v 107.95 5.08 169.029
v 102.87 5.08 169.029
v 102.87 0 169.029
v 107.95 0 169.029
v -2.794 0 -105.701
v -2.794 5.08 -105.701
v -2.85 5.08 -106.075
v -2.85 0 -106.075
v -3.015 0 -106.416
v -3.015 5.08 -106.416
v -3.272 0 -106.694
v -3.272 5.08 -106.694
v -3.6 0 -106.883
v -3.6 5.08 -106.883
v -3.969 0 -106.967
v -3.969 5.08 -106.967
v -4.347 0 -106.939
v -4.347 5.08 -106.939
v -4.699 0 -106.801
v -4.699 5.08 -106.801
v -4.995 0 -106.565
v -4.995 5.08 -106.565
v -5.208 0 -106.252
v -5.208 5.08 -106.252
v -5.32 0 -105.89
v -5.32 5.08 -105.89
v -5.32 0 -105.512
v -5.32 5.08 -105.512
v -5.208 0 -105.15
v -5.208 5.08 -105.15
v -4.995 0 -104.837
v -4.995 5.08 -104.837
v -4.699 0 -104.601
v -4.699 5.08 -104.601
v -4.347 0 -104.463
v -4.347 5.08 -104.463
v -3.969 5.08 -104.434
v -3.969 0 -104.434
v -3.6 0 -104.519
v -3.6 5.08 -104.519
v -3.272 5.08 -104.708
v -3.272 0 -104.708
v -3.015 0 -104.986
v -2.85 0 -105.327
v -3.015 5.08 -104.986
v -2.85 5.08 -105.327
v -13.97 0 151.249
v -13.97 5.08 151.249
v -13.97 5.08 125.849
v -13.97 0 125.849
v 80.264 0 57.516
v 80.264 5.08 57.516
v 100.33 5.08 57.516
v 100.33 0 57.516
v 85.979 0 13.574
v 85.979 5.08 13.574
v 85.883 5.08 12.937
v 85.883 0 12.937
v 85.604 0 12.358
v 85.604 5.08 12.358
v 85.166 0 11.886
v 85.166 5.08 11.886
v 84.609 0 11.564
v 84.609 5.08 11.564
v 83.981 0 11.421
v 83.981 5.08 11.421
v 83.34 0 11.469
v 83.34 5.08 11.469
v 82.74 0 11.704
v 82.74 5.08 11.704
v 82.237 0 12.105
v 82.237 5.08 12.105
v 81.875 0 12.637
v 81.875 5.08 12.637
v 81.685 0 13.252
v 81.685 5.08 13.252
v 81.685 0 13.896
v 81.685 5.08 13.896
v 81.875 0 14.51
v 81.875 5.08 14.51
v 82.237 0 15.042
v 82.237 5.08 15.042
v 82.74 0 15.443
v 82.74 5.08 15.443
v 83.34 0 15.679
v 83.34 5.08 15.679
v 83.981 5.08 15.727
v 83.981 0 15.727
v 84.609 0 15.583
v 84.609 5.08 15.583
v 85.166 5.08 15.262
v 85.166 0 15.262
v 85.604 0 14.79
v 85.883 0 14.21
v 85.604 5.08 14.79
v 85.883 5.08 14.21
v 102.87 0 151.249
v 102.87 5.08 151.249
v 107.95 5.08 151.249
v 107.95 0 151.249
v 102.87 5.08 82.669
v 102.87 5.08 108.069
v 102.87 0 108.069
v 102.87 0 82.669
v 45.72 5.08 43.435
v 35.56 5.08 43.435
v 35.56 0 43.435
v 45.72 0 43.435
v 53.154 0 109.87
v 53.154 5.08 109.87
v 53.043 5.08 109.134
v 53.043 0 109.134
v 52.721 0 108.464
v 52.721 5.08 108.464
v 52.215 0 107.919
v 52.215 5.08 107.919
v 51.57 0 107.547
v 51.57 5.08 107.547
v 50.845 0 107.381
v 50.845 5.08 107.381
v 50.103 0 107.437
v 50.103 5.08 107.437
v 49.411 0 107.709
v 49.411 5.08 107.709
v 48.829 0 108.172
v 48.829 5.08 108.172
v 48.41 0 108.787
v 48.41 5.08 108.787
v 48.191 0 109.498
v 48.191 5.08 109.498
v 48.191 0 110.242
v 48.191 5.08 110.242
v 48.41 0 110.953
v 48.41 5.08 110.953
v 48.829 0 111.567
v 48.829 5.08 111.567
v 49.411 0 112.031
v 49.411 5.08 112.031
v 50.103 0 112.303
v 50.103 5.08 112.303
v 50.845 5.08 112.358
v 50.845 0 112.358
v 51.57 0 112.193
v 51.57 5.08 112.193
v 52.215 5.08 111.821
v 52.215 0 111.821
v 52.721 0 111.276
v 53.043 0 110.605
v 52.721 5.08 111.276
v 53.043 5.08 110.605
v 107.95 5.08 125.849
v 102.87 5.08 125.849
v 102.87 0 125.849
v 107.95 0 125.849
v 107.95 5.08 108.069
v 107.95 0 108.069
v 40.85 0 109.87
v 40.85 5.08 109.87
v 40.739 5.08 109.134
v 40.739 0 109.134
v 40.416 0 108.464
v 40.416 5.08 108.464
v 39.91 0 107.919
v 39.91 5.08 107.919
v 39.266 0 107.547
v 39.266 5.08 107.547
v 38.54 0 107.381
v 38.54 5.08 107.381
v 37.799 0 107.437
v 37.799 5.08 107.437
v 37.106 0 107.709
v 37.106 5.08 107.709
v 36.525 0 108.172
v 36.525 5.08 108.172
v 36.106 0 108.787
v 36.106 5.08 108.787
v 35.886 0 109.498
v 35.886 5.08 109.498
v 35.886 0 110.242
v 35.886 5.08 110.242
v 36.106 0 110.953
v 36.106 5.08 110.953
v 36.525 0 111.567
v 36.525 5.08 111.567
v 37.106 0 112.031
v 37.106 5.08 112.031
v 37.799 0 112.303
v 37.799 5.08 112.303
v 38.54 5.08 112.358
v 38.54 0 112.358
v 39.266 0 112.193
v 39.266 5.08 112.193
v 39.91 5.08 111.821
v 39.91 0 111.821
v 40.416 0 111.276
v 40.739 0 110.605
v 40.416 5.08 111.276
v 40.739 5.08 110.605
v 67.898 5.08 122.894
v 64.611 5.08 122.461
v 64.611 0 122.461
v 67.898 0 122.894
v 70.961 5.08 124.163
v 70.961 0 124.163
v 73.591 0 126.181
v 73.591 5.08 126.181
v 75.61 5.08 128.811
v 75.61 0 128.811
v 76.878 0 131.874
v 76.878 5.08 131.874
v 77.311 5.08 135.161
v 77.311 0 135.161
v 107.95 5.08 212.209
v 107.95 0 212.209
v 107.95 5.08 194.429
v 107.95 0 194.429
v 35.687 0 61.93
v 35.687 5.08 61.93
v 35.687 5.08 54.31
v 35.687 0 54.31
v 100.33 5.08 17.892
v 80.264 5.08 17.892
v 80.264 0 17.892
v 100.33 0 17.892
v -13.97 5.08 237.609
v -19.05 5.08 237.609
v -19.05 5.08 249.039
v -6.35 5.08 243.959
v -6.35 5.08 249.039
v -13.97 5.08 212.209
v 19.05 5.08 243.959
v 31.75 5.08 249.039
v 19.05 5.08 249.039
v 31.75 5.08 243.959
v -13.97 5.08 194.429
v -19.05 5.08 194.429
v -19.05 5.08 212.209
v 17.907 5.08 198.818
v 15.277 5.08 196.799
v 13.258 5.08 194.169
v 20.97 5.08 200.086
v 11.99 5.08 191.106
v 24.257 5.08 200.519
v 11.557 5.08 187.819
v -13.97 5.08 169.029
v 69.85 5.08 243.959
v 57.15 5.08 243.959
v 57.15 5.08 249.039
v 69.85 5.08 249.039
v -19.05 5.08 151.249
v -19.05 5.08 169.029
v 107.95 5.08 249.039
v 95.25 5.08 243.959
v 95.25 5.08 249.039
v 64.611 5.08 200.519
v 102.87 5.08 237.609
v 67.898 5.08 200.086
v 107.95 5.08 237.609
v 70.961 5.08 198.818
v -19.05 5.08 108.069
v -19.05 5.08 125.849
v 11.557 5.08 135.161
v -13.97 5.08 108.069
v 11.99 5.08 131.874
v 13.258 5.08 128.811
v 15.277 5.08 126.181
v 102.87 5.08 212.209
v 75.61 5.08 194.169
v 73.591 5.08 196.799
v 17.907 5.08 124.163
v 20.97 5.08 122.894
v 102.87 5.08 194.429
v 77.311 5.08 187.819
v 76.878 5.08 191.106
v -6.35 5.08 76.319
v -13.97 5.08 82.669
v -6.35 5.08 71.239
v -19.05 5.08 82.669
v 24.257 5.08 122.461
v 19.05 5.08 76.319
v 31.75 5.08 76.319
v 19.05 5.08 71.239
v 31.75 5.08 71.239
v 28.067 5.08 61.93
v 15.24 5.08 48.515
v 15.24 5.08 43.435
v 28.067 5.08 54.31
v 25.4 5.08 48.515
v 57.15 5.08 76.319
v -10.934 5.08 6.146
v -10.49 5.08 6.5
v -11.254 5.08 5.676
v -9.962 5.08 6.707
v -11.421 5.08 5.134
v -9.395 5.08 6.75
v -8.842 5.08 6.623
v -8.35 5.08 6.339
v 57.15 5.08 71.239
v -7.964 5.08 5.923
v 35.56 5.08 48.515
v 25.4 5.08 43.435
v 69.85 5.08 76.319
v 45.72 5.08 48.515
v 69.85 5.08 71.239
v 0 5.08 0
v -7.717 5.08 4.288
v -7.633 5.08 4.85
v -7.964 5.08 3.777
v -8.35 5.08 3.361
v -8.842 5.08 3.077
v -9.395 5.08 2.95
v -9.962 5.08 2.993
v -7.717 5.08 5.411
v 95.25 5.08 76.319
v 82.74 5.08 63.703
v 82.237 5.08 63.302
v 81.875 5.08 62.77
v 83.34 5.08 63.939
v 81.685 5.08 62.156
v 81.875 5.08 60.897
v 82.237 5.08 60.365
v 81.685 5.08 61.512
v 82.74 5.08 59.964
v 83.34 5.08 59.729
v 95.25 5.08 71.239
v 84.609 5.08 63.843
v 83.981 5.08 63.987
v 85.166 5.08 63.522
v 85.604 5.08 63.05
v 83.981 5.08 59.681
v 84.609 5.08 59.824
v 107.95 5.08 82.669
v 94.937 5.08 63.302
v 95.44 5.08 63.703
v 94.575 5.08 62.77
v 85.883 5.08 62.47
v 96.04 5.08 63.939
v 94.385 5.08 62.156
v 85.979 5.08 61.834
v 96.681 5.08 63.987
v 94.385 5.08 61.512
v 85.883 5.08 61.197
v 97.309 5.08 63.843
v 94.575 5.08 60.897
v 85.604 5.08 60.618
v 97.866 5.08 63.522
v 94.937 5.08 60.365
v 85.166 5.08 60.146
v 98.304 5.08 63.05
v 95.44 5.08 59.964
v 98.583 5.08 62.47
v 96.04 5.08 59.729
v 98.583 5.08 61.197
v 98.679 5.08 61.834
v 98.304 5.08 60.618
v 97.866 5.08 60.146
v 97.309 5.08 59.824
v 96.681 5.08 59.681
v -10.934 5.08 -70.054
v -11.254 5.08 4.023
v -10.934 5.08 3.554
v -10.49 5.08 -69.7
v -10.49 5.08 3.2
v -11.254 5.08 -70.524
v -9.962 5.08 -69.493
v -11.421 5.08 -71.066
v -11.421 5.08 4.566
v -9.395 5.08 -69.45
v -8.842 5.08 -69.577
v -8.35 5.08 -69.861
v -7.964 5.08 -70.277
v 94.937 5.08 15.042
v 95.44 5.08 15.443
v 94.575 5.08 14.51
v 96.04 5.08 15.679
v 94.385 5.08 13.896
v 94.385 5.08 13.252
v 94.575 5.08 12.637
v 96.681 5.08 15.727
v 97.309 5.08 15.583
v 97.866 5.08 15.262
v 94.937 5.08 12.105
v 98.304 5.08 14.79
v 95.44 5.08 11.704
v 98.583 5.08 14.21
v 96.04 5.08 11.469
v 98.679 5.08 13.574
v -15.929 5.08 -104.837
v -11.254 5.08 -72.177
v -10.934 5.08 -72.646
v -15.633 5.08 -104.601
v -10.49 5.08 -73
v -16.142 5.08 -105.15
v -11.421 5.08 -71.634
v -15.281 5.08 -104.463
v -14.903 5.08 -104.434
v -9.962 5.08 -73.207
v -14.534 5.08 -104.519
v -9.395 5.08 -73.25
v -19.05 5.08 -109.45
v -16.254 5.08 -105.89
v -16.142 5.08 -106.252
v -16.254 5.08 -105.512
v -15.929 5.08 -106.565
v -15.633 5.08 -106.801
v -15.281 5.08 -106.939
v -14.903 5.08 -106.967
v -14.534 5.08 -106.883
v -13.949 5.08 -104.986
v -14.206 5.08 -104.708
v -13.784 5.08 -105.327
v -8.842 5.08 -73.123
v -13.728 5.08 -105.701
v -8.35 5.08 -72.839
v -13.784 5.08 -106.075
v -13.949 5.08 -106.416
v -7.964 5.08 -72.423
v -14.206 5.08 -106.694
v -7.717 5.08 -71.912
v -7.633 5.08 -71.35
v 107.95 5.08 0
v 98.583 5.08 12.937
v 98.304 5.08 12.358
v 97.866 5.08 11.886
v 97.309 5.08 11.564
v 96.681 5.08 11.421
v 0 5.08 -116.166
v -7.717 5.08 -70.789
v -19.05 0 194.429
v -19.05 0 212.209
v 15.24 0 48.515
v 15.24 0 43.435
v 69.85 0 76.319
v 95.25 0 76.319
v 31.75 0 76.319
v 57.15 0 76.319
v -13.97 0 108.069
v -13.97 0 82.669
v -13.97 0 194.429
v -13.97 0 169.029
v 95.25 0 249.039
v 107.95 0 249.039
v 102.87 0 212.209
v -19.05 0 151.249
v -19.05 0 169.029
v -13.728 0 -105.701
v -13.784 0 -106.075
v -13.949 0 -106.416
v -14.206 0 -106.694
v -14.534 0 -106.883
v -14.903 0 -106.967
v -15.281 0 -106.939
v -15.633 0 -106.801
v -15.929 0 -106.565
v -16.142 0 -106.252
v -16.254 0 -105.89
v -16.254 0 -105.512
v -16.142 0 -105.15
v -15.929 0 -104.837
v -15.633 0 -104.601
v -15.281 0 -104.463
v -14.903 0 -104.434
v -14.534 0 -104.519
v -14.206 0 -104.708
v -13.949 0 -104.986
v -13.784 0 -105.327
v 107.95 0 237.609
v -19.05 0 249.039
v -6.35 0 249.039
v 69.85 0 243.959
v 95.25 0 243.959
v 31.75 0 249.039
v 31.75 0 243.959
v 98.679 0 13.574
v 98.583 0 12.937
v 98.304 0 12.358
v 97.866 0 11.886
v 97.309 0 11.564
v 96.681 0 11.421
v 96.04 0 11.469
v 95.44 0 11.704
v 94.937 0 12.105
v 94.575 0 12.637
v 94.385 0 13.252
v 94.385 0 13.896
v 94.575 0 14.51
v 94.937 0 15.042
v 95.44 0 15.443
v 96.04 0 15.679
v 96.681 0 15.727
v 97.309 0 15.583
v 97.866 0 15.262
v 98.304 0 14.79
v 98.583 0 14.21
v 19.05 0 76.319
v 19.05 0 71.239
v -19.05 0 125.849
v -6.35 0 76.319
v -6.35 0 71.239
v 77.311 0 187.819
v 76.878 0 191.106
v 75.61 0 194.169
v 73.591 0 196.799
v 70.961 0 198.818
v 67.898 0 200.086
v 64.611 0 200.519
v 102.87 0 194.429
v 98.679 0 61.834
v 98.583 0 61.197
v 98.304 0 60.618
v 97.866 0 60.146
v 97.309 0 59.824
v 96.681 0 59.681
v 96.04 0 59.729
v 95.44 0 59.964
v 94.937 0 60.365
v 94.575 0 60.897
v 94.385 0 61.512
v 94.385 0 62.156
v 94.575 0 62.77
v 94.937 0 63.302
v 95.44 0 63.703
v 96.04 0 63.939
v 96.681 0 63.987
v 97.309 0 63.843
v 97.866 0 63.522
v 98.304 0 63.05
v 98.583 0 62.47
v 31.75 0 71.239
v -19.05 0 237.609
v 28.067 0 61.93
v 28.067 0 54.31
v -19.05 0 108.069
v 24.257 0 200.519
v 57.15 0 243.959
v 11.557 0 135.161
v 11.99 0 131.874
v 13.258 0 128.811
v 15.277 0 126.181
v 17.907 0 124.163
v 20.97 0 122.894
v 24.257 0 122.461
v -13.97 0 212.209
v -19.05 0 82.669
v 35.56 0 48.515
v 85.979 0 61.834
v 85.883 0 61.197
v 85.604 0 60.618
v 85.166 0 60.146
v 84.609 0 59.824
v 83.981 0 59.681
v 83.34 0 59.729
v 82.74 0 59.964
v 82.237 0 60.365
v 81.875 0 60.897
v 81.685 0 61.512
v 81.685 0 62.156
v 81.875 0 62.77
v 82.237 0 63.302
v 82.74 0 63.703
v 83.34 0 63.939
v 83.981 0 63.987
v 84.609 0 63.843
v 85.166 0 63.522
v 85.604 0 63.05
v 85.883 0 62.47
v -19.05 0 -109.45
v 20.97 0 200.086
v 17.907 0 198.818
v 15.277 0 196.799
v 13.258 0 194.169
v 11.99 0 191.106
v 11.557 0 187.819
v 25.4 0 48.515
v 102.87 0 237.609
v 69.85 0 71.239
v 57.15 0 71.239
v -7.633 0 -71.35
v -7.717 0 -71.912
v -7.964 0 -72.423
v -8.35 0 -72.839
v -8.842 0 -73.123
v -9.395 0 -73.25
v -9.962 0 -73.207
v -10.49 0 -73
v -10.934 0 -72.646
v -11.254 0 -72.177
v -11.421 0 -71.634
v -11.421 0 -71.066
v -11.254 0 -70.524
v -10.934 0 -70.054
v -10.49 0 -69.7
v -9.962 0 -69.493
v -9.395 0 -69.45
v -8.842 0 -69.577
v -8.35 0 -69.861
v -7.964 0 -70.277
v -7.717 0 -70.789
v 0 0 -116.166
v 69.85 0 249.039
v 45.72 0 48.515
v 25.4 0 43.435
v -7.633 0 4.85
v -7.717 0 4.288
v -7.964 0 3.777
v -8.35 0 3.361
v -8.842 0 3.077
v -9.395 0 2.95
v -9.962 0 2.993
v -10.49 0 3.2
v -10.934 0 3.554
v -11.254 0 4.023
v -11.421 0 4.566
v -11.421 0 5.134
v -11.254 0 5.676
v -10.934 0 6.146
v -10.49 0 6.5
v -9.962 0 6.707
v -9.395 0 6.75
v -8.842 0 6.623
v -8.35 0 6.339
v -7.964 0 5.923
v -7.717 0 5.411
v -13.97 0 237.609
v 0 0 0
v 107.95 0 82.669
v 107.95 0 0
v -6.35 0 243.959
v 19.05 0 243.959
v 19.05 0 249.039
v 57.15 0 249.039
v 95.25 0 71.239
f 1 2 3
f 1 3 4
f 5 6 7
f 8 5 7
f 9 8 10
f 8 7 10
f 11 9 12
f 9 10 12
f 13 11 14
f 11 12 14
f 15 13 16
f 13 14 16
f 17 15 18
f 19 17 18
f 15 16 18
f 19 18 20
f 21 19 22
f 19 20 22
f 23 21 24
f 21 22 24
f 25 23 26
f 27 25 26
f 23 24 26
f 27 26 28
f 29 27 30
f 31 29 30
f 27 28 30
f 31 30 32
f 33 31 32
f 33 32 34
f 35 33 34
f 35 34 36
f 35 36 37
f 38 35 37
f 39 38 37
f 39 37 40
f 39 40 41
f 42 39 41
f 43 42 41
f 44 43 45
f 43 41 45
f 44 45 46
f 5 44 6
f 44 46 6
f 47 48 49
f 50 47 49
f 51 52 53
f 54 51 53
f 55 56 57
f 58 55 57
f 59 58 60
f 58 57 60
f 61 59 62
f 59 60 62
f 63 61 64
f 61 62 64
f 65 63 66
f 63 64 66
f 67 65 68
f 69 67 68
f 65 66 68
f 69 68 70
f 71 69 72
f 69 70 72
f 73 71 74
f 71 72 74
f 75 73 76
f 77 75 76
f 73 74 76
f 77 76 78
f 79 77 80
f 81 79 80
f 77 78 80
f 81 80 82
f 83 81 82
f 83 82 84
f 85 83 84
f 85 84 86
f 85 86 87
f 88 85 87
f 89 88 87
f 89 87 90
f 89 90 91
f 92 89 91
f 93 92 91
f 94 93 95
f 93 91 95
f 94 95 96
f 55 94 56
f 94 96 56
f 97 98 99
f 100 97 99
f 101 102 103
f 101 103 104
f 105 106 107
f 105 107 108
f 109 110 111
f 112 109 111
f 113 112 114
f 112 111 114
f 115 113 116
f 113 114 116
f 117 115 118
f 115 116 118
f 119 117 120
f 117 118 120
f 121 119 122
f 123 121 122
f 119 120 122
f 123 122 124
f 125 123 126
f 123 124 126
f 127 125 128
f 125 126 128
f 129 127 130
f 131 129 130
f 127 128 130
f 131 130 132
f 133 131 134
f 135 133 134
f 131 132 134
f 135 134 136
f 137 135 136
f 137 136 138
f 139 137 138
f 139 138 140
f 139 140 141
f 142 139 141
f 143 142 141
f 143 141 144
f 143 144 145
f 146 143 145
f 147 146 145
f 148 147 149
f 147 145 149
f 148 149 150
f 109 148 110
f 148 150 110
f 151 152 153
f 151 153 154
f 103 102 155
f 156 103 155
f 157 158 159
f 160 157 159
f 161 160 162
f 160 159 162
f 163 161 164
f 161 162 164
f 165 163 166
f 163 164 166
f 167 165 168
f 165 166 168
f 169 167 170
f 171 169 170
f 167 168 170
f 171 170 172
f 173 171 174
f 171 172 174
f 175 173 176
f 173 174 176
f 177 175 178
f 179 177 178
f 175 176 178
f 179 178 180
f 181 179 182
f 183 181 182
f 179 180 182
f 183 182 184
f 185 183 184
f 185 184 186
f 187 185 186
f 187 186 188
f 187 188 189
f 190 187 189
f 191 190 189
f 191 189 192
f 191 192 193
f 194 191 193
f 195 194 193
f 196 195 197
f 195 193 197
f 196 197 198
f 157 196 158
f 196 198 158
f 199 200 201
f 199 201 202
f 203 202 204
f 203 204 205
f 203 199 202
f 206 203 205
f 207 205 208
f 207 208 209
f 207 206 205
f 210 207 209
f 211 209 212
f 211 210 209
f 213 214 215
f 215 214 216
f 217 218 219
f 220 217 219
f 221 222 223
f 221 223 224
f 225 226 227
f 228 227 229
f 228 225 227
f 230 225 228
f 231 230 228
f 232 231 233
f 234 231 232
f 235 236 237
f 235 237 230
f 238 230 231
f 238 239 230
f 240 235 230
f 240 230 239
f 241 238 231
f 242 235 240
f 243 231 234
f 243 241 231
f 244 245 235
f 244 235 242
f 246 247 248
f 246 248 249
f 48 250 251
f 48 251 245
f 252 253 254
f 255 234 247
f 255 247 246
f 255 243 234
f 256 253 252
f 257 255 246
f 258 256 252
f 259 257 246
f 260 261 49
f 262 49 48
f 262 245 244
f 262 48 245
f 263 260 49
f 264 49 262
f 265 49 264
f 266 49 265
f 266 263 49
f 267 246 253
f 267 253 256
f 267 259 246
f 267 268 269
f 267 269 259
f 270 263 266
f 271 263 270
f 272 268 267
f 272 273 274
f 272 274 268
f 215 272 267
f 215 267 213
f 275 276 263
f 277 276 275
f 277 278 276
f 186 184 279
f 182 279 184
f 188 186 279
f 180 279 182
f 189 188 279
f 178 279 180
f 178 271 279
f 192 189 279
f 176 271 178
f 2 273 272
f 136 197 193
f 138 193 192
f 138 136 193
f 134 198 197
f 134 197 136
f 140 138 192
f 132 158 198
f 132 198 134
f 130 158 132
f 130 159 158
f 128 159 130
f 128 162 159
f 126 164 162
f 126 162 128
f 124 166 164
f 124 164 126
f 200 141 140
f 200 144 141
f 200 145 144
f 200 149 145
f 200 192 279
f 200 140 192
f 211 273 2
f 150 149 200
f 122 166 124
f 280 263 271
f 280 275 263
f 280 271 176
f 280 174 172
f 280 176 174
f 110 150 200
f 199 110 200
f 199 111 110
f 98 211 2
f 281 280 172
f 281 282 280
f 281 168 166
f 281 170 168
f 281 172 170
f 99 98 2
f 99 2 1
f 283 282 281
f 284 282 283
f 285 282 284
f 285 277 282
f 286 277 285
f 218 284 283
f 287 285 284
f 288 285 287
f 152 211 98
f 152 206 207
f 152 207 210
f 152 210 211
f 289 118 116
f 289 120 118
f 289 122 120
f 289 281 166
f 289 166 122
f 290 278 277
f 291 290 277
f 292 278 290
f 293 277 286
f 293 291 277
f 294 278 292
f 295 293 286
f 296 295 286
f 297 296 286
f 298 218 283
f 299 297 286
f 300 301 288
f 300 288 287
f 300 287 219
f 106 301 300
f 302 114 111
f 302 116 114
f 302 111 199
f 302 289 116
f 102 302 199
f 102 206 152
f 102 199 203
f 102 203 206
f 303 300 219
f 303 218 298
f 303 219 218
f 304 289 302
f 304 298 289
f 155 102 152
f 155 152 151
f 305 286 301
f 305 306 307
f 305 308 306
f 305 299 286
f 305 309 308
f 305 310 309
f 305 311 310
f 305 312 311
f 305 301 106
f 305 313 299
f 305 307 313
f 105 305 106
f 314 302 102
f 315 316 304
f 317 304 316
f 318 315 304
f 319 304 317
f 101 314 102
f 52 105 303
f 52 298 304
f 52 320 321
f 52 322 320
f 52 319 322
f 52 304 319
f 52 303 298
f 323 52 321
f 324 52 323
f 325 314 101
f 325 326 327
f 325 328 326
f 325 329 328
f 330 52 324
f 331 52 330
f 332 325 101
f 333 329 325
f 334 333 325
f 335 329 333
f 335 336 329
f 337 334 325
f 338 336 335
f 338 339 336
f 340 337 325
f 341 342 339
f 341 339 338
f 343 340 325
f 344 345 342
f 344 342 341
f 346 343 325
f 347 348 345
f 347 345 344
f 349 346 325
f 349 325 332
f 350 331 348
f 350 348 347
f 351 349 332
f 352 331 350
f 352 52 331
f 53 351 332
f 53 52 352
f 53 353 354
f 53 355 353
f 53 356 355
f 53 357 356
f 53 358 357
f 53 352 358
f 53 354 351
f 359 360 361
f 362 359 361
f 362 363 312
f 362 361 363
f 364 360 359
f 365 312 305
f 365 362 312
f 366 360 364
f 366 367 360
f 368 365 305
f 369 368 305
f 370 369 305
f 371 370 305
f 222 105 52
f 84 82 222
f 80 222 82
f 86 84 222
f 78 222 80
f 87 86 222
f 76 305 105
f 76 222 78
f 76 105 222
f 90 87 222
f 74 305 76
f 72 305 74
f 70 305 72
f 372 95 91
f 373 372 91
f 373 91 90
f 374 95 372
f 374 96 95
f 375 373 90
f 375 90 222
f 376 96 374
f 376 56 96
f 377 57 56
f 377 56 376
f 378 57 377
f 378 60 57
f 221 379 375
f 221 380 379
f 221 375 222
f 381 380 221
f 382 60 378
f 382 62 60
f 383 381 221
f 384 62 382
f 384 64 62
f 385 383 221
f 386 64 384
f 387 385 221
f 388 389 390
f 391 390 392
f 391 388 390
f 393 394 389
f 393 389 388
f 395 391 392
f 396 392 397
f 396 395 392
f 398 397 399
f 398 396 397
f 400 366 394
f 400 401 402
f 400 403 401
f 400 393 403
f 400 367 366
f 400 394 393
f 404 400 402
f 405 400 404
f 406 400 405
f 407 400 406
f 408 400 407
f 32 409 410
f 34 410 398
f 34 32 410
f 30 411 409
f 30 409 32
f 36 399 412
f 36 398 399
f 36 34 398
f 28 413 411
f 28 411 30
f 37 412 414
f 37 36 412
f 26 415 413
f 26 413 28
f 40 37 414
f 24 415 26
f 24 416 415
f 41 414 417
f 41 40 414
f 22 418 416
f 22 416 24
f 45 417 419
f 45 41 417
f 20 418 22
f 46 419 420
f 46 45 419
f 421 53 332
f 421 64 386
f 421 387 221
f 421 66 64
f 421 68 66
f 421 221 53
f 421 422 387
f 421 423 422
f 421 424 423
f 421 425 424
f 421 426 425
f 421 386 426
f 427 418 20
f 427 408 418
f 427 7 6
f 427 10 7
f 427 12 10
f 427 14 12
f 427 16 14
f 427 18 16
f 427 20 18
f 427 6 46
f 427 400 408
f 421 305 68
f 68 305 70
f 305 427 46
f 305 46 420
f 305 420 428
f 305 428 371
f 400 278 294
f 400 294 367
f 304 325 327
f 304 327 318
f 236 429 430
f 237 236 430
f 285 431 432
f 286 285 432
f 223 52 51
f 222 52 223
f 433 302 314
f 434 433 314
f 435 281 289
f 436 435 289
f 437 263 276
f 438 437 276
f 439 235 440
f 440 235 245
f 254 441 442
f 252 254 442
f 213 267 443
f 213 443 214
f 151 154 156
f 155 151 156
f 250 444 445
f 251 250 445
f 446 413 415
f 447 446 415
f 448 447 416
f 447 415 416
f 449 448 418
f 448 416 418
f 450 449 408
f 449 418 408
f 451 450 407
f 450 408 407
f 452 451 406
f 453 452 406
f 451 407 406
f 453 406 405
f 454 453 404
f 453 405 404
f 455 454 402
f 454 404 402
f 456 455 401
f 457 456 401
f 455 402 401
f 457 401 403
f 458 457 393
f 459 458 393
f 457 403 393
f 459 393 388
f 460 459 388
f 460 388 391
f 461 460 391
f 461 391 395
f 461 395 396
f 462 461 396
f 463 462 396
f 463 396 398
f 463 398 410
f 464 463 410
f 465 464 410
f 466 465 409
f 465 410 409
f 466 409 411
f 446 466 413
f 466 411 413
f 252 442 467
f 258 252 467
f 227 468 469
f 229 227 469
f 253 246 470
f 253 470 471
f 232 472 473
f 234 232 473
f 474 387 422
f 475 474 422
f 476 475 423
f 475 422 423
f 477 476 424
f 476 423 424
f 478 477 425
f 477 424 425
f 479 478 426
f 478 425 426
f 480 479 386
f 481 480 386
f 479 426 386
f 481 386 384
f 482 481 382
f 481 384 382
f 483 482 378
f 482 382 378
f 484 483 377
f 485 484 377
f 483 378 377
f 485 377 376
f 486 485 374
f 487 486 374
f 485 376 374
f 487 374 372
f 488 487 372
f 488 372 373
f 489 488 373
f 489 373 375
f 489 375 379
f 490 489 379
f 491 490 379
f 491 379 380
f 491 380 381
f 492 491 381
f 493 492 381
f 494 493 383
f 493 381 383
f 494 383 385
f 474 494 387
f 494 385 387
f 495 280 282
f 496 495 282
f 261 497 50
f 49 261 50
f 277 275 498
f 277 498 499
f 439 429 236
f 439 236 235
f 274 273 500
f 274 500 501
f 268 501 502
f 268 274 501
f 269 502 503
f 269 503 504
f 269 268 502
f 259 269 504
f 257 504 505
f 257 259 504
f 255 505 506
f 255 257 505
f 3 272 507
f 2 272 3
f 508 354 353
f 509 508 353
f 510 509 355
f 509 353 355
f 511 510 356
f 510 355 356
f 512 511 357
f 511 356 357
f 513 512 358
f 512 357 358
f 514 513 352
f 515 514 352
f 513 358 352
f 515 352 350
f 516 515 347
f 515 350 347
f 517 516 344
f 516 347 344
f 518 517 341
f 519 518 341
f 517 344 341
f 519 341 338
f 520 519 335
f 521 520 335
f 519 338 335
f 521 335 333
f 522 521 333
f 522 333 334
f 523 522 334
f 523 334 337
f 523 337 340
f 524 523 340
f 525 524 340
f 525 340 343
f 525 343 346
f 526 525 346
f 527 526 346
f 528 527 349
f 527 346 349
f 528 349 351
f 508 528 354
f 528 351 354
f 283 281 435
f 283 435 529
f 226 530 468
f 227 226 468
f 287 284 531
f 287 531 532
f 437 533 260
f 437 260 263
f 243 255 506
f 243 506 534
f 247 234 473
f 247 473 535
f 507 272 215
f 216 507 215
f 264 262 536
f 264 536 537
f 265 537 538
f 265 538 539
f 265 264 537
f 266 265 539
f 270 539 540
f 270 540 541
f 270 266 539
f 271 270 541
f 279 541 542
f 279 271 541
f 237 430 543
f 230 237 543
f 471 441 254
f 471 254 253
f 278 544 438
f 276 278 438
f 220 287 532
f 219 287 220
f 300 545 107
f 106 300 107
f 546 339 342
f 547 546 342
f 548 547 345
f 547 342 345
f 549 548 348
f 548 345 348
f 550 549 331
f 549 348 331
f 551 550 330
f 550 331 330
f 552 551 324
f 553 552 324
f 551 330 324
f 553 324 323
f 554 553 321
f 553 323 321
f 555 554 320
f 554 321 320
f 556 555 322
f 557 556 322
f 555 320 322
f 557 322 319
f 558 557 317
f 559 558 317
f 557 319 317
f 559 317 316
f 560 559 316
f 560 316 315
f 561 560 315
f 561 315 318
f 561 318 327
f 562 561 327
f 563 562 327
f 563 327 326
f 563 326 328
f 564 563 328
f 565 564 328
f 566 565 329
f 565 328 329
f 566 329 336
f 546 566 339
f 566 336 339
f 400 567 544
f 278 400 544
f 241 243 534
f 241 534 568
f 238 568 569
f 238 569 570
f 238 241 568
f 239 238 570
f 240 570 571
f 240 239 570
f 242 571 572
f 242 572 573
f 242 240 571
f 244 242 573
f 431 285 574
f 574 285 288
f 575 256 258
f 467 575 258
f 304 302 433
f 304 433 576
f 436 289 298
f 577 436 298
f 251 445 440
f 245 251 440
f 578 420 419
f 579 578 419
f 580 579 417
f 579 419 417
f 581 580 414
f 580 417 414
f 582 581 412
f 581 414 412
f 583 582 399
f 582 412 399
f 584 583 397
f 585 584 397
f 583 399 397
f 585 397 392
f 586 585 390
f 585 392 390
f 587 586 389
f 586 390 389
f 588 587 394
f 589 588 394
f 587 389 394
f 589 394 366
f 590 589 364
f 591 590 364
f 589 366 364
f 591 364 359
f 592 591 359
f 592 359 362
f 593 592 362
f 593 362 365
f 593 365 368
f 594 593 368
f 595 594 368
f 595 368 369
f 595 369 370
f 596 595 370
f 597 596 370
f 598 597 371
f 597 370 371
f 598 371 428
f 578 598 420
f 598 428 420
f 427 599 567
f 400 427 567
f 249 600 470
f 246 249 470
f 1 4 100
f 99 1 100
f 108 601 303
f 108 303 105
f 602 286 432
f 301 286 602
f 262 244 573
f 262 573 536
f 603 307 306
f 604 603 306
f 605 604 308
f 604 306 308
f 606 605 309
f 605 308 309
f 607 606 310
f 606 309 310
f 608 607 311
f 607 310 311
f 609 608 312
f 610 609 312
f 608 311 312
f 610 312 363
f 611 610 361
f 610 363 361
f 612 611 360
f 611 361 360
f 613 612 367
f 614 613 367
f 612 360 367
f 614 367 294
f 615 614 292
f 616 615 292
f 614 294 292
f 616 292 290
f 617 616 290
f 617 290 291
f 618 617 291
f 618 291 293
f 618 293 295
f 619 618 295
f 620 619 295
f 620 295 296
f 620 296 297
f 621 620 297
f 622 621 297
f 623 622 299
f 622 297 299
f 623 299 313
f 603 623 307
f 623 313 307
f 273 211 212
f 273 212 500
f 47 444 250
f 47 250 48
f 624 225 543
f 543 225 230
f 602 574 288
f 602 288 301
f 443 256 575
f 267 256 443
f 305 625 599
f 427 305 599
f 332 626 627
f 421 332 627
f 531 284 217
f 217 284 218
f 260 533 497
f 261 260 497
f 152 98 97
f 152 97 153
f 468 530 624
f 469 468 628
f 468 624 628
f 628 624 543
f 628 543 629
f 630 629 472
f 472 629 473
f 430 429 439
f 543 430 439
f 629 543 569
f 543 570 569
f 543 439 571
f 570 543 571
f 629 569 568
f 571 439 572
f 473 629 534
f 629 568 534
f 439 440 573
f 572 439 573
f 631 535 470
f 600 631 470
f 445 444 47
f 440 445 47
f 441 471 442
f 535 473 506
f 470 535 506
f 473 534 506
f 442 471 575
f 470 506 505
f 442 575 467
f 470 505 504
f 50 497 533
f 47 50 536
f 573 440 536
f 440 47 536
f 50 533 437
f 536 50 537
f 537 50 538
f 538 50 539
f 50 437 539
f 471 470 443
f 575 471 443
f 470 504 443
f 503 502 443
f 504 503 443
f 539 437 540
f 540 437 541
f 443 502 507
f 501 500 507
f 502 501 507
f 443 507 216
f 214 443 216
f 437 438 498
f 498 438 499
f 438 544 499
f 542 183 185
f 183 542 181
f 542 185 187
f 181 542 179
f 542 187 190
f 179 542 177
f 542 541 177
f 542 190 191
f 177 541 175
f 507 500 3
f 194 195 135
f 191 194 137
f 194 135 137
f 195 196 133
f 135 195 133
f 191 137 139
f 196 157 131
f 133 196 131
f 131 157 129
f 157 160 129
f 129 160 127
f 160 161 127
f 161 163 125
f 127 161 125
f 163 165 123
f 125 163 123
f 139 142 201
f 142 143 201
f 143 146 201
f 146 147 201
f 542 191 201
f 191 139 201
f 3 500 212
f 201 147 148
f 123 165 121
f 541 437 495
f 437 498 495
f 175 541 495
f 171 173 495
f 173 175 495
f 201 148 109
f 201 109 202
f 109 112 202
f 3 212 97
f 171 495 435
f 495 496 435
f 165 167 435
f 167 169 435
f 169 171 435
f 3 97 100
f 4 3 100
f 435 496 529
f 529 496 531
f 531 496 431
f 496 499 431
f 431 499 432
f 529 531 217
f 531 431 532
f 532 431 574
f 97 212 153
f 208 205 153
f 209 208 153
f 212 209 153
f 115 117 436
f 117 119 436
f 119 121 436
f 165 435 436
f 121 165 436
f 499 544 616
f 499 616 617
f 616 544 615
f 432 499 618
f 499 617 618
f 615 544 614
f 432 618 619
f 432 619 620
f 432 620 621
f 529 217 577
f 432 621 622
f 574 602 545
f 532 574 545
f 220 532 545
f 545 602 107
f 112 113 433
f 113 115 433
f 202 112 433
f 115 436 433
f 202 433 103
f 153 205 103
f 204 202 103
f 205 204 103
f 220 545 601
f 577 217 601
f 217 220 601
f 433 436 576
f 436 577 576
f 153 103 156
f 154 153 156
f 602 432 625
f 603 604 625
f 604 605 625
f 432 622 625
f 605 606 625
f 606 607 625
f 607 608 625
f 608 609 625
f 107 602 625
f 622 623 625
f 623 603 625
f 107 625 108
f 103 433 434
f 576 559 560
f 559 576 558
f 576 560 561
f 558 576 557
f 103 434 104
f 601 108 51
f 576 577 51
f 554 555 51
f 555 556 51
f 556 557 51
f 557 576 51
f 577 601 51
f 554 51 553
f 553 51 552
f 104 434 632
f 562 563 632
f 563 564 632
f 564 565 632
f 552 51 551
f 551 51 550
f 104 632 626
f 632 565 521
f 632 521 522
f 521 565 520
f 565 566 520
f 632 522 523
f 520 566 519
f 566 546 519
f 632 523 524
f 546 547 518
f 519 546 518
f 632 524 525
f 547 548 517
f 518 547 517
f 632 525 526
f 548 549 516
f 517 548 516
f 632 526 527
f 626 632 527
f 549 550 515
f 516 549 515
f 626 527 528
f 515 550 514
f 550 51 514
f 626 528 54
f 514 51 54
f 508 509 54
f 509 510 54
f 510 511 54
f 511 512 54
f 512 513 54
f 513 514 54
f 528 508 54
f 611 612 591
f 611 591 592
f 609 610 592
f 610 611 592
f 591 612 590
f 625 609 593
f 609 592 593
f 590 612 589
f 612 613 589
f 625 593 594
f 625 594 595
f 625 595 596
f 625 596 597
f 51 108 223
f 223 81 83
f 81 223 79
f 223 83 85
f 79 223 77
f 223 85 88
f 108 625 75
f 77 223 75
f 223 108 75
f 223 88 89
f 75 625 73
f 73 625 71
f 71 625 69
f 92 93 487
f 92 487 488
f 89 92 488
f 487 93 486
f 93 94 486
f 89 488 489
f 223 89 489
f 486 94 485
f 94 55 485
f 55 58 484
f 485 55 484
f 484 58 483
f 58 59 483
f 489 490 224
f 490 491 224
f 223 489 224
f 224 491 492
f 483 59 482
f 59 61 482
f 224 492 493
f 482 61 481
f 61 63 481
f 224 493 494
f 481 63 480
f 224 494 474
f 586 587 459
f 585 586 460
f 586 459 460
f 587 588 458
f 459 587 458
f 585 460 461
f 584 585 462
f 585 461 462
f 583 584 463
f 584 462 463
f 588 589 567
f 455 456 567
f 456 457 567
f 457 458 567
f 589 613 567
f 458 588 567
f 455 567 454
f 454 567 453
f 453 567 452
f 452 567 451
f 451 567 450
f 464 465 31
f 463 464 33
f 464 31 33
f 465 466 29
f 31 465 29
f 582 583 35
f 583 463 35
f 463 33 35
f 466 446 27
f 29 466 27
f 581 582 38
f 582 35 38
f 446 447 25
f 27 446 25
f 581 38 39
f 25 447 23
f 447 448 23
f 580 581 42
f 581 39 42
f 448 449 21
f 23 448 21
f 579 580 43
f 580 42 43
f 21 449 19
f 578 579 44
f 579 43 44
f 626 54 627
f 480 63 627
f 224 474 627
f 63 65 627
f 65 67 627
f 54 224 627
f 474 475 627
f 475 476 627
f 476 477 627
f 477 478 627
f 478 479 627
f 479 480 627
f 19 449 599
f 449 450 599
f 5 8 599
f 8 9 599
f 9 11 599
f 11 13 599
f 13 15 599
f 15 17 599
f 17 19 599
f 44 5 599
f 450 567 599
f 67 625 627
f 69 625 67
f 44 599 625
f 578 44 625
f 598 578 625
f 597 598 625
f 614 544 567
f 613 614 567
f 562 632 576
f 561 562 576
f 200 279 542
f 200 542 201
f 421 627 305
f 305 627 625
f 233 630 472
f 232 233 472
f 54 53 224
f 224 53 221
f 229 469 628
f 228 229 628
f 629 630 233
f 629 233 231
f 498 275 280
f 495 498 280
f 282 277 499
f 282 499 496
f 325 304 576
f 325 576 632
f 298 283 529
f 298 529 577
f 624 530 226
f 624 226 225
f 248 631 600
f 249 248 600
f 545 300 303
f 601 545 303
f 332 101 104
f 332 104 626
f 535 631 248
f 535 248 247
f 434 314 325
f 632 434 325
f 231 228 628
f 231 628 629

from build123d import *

# Parameters (mm, degrees)
BOSS_EXTRUDE1_DEPTH = 5.08
SKETCH3_W           = 20.066
SKETCH3_H           = 39.624
CUT_EXTRUDE1_DEPTH  = 5.08
SKETCH4_R           = 2.159
CUT_EXTRUDE2_DEPTH  = 5.08
CUT_EXTRUDE3_DEPTH  = 5.08
SKETCH6_W           = 5.08
SKETCH6_H           = 25.4
CUT_EXTRUDE4_DEPTH  = 5.08
SKETCH7_W           = 5.08
SKETCH7_H           = 25.4
CUT_EXTRUDE5_DEPTH  = 5.08
SKETCH8_W           = 5.08
SKETCH8_H           = 25.4
CUT_EXTRUDE6_DEPTH  = 5.08
SKETCH9_W           = 5.08
SKETCH9_H           = 25.4
CUT_EXTRUDE7_DEPTH  = 5.08
SKETCH10_W          = 25.4
SKETCH10_H          = 5.08
CUT_EXTRUDE8_DEPTH  = 5.08
SKETCH11_W          = 25.4
SKETCH11_H          = 5.08
CUT_EXTRUDE9_DEPTH  = 5.08
SKETCH12_R          = 1.27
CUT_EXTRUDE10_DEPTH = 5.08
SKETCH13_W          = 10.16
SKETCH13_H          = 5.08
CUT_EXTRUDE11_DEPTH = 5.08
SKETCH14_W          = 7.62
SKETCH14_H          = 7.62
CUT_EXTRUDE12_DEPTH = 5.08
SKETCH15_R          = 1.905
CUT_EXTRUDE13_DEPTH = 5.08
SKETCH16_R          = 2.49555
CUT_EXTRUDE14_DEPTH = 5.08


with BuildPart() as part:
    # Sketch2 → Boss-Extrude1 (new body)
    with BuildSketch(Plane(origin=(0, 0, 0), x_dir=(1, 0, 0), z_dir=(0, 1, 0))):
        Polygon((-19.05, -71.23934806), (-19.05, -249.03934806), (107.95, -249.03934806), (107.95, -60.96), (107.95, 0), (0, 0), (0, 65.786), (0, 97.473109619), (0, 116.165799875), (-19.05, 109.450065503), align=None)
    extrude(amount=BOSS_EXTRUDE1_DEPTH)

    # Sketch3 → Cut-Extrude1 (cut)
    with BuildSketch(Plane(origin=(0, 5.08, 0), x_dir=(1, 0, 0), z_dir=(0, 1, 0))):
        with Locations((90.297, -37.703734372)):
            Rectangle(SKETCH3_W, SKETCH3_H)
    extrude(amount=-CUT_EXTRUDE1_DEPTH, mode=Mode.SUBTRACT)

    # Sketch4 → Cut-Extrude2 (cut)
    with BuildSketch(Plane(origin=(0, 5.08, 0), x_dir=(1, 0, 0), z_dir=(0, 1, 0))):
        with Locations((83.82, -13.573734372)):
            Circle(SKETCH4_R)
        with Locations((96.52, -13.573734372)):
            Circle(SKETCH4_R)
        with Locations((83.82, -61.833734372)):
            Circle(SKETCH4_R)
        with Locations((96.52, -61.833734372)):
            Circle(SKETCH4_R)
    extrude(amount=-CUT_EXTRUDE2_DEPTH, mode=Mode.SUBTRACT)

    # Sketch5 → Cut-Extrude3 (cut)
    with BuildSketch(Plane(origin=(0, 5.08, 0), x_dir=(1, 0, 0), z_dir=(0, 1, 0))):
        with BuildLine():
            Line((24.257, -122.461402467), (64.611105155, -122.461402467))
            ThreePointArc((64.611105155, -122.461402467), (73.591361276, -126.181146346), (77.311105155, -135.161402467))
            Line((77.311105155, -135.161402467), (77.311105155, -187.819065756))
            ThreePointArc((77.311105155, -187.819065756), (73.591361276, -196.799321877), (64.611105155, -200.519065756))
            Line((64.611105155, -200.519065756), (24.257, -200.519065756))
            ThreePointArc((24.257, -200.519065756), (15.276743879, -196.799321877), (11.557, -187.819065756))
            Line((11.557, -187.819065756), (11.557, -135.161402467))
            ThreePointArc((11.557, -135.161402467), (15.276743879, -126.181146346), (24.257, -122.461402467))
        make_face()
    extrude(amount=-CUT_EXTRUDE3_DEPTH, mode=Mode.SUBTRACT)

    # Sketch6 → Cut-Extrude4 (cut)
    with BuildSketch(Plane(origin=(0, 5.08, 0), x_dir=(1, 0, 0), z_dir=(0, 1, 0))):
        with Locations((105.41, -224.90934806)):
            Rectangle(SKETCH6_W, SKETCH6_H)
    extrude(amount=-CUT_EXTRUDE4_DEPTH, mode=Mode.SUBTRACT)

    # Sketch7 → Cut-Extrude5 (cut)
    with BuildSketch(Plane(origin=(0, 5.08, 0), x_dir=(1, 0, 0), z_dir=(0, 1, 0))):
        with Locations((105.41, -181.72934806)):
            Rectangle(SKETCH7_W, SKETCH7_H)
    extrude(amount=-CUT_EXTRUDE5_DEPTH, mode=Mode.SUBTRACT)

    # Sketch8 → Cut-Extrude6 (cut)
    with BuildSketch(Plane(origin=(0, 5.08, 0), x_dir=(1, 0, 0), z_dir=(0, 1, 0))):
        with Locations((105.41, -138.54934806)):
            Rectangle(SKETCH8_W, SKETCH8_H)
        with Locations((105.41, -95.36934806)):
            Rectangle(SKETCH8_W, SKETCH8_H)
    extrude(amount=-CUT_EXTRUDE6_DEPTH, mode=Mode.SUBTRACT)

    # Sketch9 → Cut-Extrude7 (cut)
    with BuildSketch(Plane(origin=(0, 5.08, 0), x_dir=(1, 0, 0), z_dir=(0, 1, 0))):
        with Locations((-16.51, -224.90934806)):
            Rectangle(SKETCH9_W, SKETCH9_H)
        with Locations((-16.51, -181.72934806)):
            Rectangle(SKETCH9_W, SKETCH9_H)
        with Locations((-16.51, -138.54934806)):
            Rectangle(SKETCH9_W, SKETCH9_H)
        with Locations((-16.51, -95.36934806)):
            Rectangle(SKETCH9_W, SKETCH9_H)
    extrude(amount=-CUT_EXTRUDE7_DEPTH, mode=Mode.SUBTRACT)

    # Sketch10 → Cut-Extrude8 (cut)
    with BuildSketch(Plane(origin=(0, 5.08, 0), x_dir=(1, 0, 0), z_dir=(0, 1, 0))):
        with Locations((6.35, -73.77934806)):
            Rectangle(SKETCH10_W, SKETCH10_H)
        with Locations((44.45, -73.77934806)):
            Rectangle(SKETCH10_W, SKETCH10_H)
        with Locations((82.55, -73.77934806)):
            Rectangle(SKETCH10_W, SKETCH10_H)
    extrude(amount=-CUT_EXTRUDE8_DEPTH, mode=Mode.SUBTRACT)

    # Sketch11 → Cut-Extrude9 (cut)
    with BuildSketch(Plane(origin=(0, 5.08, 0), x_dir=(1, 0, 0), z_dir=(0, 1, 0))):
        with Locations((6.35, -246.49934806)):
            Rectangle(SKETCH11_W, SKETCH11_H)
        with Locations((44.45, -246.49934806)):
            Rectangle(SKETCH11_W, SKETCH11_H)
        with Locations((82.55, -246.49934806)):
            Rectangle(SKETCH11_W, SKETCH11_H)
    extrude(amount=-CUT_EXTRUDE9_DEPTH, mode=Mode.SUBTRACT)

    # Sketch12 → Cut-Extrude10 (cut)
    with BuildSketch(Plane(origin=(0, 5.08, 0), x_dir=(1, 0, 0), z_dir=(0, 1, 0))):
        with Locations((-14.998025324, 105.700929136)):
            Circle(SKETCH12_R)
        with Locations((-4.064, 105.700929136)):
            Circle(SKETCH12_R)
    extrude(amount=-CUT_EXTRUDE10_DEPTH, mode=Mode.SUBTRACT)

    # Sketch13 → Cut-Extrude11 (cut)
    with BuildSketch(Plane(origin=(0, 5.08, 0), x_dir=(1, 0, 0), z_dir=(0, 1, 0))):
        with Locations((20.32, -45.974710139)):
            Rectangle(SKETCH13_W, SKETCH13_H)
        with Locations((40.64, -45.974710139)):
            Rectangle(SKETCH13_W, SKETCH13_H)
    extrude(amount=-CUT_EXTRUDE11_DEPTH, mode=Mode.SUBTRACT)

    # Sketch14 → Cut-Extrude12 (cut)
    with BuildSketch(Plane(origin=(0, 5.08, 0), x_dir=(1, 0, 0), z_dir=(0, 1, 0))):
        with Locations((31.877, -58.119790423)):
            Rectangle(SKETCH14_W, SKETCH14_H)
    extrude(amount=-CUT_EXTRUDE12_DEPTH, mode=Mode.SUBTRACT)

    # Sketch15 → Cut-Extrude13 (cut)
    with BuildSketch(Plane(origin=(0, 5.08, 0), x_dir=(1, 0, 0), z_dir=(0, 1, 0))):
        with Locations((-9.5377, 71.350065503)):
            Circle(SKETCH15_R)
        with Locations((-9.5377, -4.849934497)):
            Circle(SKETCH15_R)
    extrude(amount=-CUT_EXTRUDE13_DEPTH, mode=Mode.SUBTRACT)

    # Sketch16 → Cut-Extrude14 (cut)
    with BuildSketch(Plane(origin=(0, 5.08, 0), x_dir=(1, 0, 0), z_dir=(0, 1, 0))):
        with Locations((38.354, -109.869872905)):
            Circle(SKETCH16_R)
        with Locations((50.658638695, -109.869872905)):
            Circle(SKETCH16_R)
    extrude(amount=-CUT_EXTRUDE14_DEPTH, mode=Mode.SUBTRACT)


solid = part.part
